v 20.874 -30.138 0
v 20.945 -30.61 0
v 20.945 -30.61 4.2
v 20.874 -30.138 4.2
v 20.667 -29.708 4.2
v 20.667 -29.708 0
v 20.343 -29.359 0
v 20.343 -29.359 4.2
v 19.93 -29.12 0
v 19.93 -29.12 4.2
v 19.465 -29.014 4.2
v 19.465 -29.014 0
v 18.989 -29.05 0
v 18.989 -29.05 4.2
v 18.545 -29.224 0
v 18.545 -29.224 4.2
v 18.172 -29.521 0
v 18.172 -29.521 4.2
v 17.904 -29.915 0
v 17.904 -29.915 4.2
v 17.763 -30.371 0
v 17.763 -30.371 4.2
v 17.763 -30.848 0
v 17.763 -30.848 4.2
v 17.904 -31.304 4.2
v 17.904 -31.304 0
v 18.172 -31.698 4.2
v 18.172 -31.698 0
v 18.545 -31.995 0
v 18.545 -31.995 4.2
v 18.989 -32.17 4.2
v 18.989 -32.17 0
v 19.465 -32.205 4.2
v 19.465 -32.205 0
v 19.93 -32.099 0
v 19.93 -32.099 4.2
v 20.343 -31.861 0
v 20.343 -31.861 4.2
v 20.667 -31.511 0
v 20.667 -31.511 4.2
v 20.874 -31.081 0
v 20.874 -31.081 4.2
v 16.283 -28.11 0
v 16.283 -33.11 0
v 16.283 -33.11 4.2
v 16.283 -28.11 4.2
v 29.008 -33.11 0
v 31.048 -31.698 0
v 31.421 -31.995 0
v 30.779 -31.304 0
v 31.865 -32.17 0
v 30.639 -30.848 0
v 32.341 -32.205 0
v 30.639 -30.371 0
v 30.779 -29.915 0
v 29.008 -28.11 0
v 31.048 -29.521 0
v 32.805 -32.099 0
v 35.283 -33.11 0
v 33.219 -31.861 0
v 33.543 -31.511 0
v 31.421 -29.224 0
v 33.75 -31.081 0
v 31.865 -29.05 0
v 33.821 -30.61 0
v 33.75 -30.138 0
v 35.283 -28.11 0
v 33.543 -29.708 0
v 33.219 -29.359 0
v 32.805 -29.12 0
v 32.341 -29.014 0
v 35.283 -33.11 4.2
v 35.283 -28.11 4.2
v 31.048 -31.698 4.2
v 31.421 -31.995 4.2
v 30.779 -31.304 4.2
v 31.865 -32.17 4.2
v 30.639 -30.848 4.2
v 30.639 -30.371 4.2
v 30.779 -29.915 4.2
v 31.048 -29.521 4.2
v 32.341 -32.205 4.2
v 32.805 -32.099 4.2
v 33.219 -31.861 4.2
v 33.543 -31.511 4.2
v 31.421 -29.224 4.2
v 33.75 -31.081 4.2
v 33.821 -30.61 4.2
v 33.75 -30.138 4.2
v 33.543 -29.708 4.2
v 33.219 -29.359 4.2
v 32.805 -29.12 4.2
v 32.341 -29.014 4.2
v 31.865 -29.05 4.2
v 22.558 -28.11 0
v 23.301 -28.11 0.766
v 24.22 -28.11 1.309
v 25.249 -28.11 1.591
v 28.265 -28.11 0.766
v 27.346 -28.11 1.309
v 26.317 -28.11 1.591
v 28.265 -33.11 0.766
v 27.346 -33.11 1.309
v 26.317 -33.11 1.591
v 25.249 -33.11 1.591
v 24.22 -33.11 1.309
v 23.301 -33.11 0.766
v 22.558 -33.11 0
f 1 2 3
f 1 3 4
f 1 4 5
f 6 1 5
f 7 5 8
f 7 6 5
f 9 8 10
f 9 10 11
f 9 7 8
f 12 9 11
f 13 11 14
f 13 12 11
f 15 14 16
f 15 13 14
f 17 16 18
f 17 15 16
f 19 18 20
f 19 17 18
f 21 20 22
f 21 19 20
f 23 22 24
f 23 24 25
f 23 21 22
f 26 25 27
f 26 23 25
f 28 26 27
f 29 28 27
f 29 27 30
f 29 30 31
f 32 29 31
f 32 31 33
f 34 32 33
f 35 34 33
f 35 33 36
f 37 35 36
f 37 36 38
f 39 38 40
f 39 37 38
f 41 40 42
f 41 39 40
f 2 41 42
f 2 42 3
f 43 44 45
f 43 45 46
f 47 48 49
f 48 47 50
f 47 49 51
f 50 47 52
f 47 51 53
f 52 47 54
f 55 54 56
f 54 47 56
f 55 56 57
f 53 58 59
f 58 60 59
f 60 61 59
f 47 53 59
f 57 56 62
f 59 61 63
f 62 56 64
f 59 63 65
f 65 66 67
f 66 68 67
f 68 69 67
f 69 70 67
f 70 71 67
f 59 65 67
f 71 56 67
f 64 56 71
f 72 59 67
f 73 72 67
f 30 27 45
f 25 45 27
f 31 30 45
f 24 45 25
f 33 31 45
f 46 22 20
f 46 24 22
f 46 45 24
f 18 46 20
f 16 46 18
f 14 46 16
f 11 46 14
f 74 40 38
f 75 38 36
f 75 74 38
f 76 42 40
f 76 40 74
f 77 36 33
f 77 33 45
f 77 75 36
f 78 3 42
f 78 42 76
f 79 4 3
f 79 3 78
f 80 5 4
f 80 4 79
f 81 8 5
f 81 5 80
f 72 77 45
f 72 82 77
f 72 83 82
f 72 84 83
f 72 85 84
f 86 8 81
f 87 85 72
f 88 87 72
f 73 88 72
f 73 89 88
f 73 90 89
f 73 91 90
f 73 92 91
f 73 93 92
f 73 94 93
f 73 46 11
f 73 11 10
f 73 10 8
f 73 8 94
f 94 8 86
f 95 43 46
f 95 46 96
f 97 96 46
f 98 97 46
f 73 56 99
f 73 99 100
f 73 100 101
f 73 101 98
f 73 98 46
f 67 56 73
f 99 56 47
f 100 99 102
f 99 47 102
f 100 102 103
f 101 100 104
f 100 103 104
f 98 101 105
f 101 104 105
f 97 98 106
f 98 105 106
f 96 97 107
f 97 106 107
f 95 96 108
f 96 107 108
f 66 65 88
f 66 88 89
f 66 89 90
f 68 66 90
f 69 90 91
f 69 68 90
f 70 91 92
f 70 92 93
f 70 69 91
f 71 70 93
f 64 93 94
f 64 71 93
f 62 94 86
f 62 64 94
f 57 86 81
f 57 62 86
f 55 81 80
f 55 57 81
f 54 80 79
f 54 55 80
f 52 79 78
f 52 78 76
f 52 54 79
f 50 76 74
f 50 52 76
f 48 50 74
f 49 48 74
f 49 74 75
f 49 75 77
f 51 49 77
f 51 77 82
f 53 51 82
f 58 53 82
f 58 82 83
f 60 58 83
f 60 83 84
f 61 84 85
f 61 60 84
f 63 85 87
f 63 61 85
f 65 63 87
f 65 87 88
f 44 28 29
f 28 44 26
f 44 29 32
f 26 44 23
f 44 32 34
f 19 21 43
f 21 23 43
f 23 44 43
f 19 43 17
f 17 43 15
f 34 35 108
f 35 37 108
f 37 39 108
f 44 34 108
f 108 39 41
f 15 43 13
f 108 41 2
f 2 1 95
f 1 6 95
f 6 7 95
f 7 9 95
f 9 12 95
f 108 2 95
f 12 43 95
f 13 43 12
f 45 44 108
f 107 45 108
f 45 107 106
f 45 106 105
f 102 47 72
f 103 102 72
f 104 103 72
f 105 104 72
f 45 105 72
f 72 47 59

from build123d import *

# Parameters (mm, degrees)
CROQUIS1_W              = 19
CROQUIS1_H              = 5
CROQUIS1_R              = 1.6
SALIENTE_EXTRUIR1_DEPTH = 4.2
CROQUIS2_R              = 4.009695102
CORTAR_EXTRUIR1_DEPTH   = 7.2


with BuildPart() as part:
    # Croquis1 → Saliente-Extruir1 (new body)
    with BuildSketch(Plane.XY):
        with Locations((25.783027827, -30.609692022)):
            Rectangle(CROQUIS1_W, CROQUIS1_H)
        with Locations((19.34510909, -30.609692022)):
            Circle(CROQUIS1_R, mode=Mode.SUBTRACT)
        with Locations((32.220946564, -30.609692022)):
            Circle(CROQUIS1_R, mode=Mode.SUBTRACT)
    extrude(amount=SALIENTE_EXTRUIR1_DEPTH)

    # Croquis2 → Cortar-Extruir1 (cut)
    with BuildSketch(Plane.XZ.offset(33.109692022)):
        with Locations((25.783027827, -2.383165564)):
            Circle(CROQUIS2_R)
    extrude(amount=-CORTAR_EXTRUIR1_DEPTH, mode=Mode.SUBTRACT)


solid = part.part
